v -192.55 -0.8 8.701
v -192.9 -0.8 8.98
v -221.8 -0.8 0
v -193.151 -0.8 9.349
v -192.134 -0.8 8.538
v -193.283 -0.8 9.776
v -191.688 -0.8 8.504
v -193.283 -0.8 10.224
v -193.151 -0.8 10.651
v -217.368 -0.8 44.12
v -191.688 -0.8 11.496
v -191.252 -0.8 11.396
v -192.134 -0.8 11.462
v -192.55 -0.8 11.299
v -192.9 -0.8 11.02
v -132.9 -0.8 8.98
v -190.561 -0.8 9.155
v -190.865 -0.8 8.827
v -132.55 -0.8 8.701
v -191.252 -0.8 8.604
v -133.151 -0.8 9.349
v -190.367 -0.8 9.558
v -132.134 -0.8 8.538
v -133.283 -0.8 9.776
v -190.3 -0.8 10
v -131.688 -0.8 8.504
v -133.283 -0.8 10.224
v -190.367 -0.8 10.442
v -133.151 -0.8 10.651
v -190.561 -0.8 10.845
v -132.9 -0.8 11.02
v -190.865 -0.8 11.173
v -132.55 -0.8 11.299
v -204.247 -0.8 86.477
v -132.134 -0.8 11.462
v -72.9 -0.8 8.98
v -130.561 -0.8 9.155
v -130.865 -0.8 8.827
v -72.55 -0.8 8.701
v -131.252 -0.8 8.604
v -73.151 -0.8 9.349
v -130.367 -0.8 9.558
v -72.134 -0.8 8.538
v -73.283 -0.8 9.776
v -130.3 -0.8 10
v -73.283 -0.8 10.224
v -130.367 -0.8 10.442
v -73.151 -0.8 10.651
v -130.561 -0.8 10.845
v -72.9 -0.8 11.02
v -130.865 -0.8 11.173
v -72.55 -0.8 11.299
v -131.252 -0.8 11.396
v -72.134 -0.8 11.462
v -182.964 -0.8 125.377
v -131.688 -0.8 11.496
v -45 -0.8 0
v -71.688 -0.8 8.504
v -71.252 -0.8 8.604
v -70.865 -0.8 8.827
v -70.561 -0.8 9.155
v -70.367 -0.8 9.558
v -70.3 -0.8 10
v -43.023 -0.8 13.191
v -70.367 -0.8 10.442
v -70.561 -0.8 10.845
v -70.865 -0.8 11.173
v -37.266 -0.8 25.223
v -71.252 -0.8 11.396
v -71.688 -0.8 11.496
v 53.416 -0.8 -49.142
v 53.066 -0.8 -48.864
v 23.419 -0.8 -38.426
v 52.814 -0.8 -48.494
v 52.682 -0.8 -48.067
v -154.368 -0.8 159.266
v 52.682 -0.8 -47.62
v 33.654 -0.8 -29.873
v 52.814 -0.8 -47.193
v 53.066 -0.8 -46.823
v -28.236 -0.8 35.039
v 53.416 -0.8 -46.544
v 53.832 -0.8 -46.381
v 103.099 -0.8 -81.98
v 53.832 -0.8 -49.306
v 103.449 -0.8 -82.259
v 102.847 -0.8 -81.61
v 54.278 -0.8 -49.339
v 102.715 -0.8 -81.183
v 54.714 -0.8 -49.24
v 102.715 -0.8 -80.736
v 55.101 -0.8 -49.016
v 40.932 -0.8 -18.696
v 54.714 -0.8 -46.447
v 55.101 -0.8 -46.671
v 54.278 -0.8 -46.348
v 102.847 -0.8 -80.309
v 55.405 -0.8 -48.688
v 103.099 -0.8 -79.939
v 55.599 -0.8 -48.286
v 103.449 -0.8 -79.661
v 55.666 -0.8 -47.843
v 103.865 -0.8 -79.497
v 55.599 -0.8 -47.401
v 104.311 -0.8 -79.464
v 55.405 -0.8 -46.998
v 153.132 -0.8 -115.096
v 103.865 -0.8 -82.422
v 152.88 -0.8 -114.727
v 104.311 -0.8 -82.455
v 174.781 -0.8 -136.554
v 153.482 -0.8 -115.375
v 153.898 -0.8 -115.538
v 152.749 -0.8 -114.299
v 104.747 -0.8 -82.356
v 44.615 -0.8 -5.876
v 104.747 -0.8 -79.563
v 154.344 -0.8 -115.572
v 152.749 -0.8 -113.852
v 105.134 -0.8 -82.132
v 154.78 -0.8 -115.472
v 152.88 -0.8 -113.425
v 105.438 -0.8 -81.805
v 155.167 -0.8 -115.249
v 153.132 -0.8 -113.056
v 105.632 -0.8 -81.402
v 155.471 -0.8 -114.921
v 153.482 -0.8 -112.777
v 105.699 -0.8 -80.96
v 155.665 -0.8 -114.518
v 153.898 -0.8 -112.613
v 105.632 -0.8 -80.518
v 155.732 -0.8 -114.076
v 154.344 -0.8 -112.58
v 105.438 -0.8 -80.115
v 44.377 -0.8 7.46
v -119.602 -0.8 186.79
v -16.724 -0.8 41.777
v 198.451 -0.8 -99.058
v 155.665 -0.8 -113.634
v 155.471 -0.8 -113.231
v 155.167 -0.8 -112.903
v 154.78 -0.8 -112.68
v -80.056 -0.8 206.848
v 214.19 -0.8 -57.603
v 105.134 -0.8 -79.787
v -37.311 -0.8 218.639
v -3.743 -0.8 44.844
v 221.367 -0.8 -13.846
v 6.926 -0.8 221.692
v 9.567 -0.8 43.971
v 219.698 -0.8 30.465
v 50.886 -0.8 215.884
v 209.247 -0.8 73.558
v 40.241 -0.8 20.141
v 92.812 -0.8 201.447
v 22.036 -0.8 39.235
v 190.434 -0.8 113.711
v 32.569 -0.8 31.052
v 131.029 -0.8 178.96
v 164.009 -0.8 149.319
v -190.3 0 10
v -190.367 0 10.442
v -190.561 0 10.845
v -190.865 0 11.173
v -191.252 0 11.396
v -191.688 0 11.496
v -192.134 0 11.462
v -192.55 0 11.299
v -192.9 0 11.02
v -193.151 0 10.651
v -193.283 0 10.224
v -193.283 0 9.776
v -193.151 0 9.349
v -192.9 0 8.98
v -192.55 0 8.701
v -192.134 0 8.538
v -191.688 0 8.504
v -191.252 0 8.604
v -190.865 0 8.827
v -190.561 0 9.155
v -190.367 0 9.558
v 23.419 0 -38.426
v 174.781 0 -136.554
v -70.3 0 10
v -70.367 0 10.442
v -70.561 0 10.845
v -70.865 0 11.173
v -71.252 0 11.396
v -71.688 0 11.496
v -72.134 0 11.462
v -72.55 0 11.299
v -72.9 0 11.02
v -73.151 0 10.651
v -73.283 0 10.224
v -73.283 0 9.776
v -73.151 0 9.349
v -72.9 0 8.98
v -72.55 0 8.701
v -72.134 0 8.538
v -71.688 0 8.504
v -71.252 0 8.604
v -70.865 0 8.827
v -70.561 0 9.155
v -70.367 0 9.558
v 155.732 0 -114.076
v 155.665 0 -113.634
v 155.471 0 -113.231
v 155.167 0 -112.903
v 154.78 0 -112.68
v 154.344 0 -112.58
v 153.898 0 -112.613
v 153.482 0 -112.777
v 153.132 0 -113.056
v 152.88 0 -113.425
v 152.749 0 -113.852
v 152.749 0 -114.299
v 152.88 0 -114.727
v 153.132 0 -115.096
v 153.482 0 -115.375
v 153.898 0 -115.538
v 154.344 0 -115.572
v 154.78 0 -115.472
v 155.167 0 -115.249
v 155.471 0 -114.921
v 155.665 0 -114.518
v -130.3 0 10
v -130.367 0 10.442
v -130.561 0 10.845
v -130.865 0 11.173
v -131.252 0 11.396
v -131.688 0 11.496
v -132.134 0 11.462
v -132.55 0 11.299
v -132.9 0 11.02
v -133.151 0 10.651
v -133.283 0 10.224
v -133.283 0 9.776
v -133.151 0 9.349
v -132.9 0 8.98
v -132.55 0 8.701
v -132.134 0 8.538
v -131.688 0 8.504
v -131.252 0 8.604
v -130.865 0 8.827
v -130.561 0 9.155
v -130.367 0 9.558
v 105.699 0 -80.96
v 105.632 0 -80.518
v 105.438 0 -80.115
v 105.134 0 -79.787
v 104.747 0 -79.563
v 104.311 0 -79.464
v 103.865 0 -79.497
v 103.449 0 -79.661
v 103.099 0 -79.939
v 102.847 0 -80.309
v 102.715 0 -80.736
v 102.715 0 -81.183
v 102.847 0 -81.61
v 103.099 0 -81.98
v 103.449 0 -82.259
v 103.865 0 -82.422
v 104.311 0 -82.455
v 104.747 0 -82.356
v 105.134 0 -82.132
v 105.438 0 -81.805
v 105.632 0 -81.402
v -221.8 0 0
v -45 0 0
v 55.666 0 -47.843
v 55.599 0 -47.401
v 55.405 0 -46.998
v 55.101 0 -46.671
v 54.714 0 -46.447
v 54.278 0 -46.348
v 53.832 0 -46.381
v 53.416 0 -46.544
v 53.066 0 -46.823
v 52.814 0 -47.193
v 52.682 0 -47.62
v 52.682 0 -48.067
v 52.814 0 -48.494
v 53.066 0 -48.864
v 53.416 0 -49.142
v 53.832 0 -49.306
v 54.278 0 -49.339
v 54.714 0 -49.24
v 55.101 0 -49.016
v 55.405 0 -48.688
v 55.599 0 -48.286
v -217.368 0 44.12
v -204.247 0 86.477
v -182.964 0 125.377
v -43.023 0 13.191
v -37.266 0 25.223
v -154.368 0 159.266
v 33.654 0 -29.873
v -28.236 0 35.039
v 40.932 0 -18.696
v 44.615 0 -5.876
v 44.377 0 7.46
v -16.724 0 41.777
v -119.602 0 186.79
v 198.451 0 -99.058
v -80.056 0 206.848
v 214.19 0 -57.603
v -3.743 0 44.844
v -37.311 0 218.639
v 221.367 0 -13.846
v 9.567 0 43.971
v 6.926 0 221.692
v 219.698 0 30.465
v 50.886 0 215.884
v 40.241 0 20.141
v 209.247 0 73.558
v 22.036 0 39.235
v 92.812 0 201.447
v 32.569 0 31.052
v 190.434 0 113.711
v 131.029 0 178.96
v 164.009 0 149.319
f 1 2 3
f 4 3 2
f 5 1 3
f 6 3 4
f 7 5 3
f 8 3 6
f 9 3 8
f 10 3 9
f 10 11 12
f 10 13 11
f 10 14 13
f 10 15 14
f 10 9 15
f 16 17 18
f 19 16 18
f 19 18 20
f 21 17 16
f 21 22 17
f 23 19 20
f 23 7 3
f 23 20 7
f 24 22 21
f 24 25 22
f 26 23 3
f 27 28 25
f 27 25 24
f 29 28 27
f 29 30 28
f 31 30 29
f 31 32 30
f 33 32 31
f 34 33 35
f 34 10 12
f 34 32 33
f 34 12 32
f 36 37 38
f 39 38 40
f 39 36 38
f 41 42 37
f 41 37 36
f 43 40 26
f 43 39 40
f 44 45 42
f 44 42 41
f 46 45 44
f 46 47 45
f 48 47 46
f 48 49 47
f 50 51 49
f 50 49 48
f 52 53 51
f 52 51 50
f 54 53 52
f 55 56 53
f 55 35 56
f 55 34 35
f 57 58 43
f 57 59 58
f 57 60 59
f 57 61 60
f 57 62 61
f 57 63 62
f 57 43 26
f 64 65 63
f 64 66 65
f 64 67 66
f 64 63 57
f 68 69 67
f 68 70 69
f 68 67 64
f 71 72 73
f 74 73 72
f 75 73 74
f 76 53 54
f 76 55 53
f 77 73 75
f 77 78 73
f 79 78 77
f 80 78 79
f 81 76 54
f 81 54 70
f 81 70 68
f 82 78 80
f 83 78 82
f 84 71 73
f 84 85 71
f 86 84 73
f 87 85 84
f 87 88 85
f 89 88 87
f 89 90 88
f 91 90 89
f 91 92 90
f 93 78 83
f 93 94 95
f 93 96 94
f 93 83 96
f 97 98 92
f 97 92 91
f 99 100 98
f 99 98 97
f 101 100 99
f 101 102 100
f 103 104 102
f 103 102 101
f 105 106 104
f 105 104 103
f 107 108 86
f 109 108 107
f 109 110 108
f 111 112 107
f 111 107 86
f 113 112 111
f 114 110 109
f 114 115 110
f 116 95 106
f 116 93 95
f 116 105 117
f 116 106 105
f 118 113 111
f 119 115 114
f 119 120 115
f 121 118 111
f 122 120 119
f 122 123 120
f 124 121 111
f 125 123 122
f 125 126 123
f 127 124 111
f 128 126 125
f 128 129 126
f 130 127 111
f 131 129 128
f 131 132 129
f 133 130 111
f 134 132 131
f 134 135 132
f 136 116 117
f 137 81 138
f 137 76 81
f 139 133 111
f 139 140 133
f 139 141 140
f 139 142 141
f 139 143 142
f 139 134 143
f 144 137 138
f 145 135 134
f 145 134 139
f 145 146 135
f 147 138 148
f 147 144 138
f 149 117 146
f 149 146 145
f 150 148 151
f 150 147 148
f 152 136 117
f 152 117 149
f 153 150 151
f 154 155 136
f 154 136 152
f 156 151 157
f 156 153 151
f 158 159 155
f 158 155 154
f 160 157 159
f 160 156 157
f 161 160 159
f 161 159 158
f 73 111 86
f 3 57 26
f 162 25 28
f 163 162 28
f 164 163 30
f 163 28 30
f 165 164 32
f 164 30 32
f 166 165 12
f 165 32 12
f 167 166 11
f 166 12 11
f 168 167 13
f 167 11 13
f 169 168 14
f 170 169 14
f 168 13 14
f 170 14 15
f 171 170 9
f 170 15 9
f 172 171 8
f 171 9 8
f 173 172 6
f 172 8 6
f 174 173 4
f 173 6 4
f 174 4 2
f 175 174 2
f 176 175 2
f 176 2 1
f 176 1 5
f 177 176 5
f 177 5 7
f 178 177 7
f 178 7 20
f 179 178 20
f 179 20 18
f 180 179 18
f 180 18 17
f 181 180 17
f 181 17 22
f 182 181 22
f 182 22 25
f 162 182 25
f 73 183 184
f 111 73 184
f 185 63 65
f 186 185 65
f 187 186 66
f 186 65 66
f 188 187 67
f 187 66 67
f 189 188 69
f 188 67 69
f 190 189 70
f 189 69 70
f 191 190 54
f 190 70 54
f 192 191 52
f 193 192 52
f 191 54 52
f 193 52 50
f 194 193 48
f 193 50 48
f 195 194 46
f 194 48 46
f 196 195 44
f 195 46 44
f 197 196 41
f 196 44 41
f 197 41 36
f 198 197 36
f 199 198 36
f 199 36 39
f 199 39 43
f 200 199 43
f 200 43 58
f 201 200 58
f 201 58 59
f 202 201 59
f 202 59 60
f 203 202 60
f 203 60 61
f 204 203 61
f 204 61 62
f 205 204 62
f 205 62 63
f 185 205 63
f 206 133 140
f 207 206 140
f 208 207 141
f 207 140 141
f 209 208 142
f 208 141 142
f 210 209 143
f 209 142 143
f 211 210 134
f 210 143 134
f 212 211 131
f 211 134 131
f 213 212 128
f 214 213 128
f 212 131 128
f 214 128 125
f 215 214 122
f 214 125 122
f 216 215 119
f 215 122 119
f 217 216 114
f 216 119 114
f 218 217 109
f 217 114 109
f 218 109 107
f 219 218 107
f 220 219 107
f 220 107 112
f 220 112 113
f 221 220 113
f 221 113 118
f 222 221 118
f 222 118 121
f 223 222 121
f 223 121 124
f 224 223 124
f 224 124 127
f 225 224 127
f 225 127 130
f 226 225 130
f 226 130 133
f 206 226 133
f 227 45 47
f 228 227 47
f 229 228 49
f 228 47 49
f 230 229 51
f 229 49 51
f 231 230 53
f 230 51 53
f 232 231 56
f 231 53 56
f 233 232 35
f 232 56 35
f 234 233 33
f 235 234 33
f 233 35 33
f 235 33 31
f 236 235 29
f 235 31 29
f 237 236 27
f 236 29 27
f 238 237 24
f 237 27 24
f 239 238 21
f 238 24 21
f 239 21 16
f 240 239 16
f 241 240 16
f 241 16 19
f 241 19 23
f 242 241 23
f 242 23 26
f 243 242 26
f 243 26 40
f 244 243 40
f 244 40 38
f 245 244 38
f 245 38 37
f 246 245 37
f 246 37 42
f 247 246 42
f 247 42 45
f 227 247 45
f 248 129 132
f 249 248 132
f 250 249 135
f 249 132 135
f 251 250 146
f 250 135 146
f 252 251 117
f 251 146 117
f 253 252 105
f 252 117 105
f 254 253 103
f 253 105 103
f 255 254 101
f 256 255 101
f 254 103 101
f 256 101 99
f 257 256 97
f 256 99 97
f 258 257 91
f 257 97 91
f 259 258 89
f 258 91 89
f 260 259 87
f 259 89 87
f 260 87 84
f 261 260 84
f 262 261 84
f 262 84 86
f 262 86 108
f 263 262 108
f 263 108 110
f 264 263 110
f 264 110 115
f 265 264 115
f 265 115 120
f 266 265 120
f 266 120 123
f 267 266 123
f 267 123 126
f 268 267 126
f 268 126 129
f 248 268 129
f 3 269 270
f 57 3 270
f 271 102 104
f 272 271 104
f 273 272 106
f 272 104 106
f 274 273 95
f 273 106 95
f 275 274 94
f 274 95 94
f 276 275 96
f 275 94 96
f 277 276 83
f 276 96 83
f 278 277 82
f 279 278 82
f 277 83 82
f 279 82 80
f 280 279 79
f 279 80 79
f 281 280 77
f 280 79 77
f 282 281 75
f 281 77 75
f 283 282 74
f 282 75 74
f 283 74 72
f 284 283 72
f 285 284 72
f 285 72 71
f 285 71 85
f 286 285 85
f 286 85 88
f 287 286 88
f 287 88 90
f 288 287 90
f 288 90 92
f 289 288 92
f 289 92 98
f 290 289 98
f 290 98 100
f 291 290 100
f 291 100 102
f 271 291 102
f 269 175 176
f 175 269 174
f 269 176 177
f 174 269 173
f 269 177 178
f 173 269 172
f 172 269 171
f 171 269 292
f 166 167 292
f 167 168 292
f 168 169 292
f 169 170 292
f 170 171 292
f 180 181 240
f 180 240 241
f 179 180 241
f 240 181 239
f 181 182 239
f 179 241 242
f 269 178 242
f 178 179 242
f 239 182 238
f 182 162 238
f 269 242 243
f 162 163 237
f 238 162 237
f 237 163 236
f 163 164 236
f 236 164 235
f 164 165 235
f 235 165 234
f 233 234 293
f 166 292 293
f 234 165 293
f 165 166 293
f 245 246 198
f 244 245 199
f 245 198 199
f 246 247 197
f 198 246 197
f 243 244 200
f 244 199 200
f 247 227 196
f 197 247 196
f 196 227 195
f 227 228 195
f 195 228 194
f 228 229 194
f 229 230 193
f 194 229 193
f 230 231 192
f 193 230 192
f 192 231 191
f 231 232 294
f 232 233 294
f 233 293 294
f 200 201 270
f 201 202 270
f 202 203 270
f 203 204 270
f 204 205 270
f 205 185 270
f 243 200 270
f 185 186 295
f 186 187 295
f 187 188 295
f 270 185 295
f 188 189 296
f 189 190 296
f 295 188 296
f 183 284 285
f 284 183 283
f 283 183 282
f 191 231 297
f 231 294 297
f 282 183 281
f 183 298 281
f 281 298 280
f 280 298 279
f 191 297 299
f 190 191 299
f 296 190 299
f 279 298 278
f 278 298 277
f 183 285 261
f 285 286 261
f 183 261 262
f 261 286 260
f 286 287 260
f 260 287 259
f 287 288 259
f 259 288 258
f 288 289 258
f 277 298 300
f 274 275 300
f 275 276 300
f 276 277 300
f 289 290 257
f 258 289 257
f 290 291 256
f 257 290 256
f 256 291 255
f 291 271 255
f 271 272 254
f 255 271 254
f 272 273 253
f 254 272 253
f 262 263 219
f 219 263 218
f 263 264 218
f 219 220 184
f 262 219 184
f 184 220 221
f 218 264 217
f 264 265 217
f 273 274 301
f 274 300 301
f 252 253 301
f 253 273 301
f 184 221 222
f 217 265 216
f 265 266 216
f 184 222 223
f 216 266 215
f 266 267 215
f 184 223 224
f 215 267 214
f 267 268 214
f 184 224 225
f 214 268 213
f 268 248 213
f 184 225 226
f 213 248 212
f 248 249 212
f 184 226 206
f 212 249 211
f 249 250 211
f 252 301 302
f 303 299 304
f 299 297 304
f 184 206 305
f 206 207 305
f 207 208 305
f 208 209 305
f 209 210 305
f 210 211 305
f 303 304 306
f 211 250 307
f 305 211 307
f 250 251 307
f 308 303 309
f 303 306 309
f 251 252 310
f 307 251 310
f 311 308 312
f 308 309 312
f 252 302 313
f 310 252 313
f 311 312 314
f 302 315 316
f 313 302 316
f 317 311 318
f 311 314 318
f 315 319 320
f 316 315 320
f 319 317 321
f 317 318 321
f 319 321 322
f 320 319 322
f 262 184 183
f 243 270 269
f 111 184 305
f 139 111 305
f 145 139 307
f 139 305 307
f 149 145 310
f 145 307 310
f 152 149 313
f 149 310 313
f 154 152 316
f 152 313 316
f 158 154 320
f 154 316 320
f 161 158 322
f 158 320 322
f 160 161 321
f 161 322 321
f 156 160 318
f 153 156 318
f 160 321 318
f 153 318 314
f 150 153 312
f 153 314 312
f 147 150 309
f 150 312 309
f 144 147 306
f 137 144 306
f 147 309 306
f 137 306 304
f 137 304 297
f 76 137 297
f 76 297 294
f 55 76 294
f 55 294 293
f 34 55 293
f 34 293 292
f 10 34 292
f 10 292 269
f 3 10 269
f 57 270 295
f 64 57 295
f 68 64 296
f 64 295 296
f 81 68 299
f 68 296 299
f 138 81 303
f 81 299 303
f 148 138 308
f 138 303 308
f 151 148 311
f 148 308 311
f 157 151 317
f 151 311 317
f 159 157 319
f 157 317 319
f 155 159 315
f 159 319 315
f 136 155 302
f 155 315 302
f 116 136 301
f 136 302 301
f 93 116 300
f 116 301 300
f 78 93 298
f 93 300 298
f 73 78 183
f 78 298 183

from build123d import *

# Parameters (mm, degrees)
F3_DEPTH = 0.8
F4_R     = 1.5
F5_DEPTH = 25


with BuildPart() as f3:
    # F2 (on Front) → F3 (new body)
    with BuildSketch(Plane.XZ):
        with BuildLine():
            ThreePointArc((-45, 0), (22.035907, 39.235428), (23.418613, -38.426145))
            Line((23.418613, -38.426145), (174.780785, -136.553715))
            ThreePointArc((174.780785, -136.553715), (72.211017, 209.71602), (-221.8, 0))
            Line((-221.8, 0), (-45, 0))
        make_face()
    extrude(amount=F3_DEPTH)

    # F4 (on face) → F5 (cut)
    with BuildSketch(Plane.XZ.offset(0.8)):
        with Locations((-191.8, 10)):
            Circle(F4_R)
        with Locations((-131.8, 10)):
            Circle(F4_R)
        with Locations((-71.8, 10)):
            Circle(F4_R)
        with Locations((154.231854, -114.075886)):
            Circle(F4_R)
        with Locations((104.198704, -80.959667)):
            Circle(F4_R)
        with Locations((54.165555, -47.843448)):
            Circle(F4_R)
    extrude(amount=-F5_DEPTH, mode=Mode.SUBTRACT)


solid = f3.part
